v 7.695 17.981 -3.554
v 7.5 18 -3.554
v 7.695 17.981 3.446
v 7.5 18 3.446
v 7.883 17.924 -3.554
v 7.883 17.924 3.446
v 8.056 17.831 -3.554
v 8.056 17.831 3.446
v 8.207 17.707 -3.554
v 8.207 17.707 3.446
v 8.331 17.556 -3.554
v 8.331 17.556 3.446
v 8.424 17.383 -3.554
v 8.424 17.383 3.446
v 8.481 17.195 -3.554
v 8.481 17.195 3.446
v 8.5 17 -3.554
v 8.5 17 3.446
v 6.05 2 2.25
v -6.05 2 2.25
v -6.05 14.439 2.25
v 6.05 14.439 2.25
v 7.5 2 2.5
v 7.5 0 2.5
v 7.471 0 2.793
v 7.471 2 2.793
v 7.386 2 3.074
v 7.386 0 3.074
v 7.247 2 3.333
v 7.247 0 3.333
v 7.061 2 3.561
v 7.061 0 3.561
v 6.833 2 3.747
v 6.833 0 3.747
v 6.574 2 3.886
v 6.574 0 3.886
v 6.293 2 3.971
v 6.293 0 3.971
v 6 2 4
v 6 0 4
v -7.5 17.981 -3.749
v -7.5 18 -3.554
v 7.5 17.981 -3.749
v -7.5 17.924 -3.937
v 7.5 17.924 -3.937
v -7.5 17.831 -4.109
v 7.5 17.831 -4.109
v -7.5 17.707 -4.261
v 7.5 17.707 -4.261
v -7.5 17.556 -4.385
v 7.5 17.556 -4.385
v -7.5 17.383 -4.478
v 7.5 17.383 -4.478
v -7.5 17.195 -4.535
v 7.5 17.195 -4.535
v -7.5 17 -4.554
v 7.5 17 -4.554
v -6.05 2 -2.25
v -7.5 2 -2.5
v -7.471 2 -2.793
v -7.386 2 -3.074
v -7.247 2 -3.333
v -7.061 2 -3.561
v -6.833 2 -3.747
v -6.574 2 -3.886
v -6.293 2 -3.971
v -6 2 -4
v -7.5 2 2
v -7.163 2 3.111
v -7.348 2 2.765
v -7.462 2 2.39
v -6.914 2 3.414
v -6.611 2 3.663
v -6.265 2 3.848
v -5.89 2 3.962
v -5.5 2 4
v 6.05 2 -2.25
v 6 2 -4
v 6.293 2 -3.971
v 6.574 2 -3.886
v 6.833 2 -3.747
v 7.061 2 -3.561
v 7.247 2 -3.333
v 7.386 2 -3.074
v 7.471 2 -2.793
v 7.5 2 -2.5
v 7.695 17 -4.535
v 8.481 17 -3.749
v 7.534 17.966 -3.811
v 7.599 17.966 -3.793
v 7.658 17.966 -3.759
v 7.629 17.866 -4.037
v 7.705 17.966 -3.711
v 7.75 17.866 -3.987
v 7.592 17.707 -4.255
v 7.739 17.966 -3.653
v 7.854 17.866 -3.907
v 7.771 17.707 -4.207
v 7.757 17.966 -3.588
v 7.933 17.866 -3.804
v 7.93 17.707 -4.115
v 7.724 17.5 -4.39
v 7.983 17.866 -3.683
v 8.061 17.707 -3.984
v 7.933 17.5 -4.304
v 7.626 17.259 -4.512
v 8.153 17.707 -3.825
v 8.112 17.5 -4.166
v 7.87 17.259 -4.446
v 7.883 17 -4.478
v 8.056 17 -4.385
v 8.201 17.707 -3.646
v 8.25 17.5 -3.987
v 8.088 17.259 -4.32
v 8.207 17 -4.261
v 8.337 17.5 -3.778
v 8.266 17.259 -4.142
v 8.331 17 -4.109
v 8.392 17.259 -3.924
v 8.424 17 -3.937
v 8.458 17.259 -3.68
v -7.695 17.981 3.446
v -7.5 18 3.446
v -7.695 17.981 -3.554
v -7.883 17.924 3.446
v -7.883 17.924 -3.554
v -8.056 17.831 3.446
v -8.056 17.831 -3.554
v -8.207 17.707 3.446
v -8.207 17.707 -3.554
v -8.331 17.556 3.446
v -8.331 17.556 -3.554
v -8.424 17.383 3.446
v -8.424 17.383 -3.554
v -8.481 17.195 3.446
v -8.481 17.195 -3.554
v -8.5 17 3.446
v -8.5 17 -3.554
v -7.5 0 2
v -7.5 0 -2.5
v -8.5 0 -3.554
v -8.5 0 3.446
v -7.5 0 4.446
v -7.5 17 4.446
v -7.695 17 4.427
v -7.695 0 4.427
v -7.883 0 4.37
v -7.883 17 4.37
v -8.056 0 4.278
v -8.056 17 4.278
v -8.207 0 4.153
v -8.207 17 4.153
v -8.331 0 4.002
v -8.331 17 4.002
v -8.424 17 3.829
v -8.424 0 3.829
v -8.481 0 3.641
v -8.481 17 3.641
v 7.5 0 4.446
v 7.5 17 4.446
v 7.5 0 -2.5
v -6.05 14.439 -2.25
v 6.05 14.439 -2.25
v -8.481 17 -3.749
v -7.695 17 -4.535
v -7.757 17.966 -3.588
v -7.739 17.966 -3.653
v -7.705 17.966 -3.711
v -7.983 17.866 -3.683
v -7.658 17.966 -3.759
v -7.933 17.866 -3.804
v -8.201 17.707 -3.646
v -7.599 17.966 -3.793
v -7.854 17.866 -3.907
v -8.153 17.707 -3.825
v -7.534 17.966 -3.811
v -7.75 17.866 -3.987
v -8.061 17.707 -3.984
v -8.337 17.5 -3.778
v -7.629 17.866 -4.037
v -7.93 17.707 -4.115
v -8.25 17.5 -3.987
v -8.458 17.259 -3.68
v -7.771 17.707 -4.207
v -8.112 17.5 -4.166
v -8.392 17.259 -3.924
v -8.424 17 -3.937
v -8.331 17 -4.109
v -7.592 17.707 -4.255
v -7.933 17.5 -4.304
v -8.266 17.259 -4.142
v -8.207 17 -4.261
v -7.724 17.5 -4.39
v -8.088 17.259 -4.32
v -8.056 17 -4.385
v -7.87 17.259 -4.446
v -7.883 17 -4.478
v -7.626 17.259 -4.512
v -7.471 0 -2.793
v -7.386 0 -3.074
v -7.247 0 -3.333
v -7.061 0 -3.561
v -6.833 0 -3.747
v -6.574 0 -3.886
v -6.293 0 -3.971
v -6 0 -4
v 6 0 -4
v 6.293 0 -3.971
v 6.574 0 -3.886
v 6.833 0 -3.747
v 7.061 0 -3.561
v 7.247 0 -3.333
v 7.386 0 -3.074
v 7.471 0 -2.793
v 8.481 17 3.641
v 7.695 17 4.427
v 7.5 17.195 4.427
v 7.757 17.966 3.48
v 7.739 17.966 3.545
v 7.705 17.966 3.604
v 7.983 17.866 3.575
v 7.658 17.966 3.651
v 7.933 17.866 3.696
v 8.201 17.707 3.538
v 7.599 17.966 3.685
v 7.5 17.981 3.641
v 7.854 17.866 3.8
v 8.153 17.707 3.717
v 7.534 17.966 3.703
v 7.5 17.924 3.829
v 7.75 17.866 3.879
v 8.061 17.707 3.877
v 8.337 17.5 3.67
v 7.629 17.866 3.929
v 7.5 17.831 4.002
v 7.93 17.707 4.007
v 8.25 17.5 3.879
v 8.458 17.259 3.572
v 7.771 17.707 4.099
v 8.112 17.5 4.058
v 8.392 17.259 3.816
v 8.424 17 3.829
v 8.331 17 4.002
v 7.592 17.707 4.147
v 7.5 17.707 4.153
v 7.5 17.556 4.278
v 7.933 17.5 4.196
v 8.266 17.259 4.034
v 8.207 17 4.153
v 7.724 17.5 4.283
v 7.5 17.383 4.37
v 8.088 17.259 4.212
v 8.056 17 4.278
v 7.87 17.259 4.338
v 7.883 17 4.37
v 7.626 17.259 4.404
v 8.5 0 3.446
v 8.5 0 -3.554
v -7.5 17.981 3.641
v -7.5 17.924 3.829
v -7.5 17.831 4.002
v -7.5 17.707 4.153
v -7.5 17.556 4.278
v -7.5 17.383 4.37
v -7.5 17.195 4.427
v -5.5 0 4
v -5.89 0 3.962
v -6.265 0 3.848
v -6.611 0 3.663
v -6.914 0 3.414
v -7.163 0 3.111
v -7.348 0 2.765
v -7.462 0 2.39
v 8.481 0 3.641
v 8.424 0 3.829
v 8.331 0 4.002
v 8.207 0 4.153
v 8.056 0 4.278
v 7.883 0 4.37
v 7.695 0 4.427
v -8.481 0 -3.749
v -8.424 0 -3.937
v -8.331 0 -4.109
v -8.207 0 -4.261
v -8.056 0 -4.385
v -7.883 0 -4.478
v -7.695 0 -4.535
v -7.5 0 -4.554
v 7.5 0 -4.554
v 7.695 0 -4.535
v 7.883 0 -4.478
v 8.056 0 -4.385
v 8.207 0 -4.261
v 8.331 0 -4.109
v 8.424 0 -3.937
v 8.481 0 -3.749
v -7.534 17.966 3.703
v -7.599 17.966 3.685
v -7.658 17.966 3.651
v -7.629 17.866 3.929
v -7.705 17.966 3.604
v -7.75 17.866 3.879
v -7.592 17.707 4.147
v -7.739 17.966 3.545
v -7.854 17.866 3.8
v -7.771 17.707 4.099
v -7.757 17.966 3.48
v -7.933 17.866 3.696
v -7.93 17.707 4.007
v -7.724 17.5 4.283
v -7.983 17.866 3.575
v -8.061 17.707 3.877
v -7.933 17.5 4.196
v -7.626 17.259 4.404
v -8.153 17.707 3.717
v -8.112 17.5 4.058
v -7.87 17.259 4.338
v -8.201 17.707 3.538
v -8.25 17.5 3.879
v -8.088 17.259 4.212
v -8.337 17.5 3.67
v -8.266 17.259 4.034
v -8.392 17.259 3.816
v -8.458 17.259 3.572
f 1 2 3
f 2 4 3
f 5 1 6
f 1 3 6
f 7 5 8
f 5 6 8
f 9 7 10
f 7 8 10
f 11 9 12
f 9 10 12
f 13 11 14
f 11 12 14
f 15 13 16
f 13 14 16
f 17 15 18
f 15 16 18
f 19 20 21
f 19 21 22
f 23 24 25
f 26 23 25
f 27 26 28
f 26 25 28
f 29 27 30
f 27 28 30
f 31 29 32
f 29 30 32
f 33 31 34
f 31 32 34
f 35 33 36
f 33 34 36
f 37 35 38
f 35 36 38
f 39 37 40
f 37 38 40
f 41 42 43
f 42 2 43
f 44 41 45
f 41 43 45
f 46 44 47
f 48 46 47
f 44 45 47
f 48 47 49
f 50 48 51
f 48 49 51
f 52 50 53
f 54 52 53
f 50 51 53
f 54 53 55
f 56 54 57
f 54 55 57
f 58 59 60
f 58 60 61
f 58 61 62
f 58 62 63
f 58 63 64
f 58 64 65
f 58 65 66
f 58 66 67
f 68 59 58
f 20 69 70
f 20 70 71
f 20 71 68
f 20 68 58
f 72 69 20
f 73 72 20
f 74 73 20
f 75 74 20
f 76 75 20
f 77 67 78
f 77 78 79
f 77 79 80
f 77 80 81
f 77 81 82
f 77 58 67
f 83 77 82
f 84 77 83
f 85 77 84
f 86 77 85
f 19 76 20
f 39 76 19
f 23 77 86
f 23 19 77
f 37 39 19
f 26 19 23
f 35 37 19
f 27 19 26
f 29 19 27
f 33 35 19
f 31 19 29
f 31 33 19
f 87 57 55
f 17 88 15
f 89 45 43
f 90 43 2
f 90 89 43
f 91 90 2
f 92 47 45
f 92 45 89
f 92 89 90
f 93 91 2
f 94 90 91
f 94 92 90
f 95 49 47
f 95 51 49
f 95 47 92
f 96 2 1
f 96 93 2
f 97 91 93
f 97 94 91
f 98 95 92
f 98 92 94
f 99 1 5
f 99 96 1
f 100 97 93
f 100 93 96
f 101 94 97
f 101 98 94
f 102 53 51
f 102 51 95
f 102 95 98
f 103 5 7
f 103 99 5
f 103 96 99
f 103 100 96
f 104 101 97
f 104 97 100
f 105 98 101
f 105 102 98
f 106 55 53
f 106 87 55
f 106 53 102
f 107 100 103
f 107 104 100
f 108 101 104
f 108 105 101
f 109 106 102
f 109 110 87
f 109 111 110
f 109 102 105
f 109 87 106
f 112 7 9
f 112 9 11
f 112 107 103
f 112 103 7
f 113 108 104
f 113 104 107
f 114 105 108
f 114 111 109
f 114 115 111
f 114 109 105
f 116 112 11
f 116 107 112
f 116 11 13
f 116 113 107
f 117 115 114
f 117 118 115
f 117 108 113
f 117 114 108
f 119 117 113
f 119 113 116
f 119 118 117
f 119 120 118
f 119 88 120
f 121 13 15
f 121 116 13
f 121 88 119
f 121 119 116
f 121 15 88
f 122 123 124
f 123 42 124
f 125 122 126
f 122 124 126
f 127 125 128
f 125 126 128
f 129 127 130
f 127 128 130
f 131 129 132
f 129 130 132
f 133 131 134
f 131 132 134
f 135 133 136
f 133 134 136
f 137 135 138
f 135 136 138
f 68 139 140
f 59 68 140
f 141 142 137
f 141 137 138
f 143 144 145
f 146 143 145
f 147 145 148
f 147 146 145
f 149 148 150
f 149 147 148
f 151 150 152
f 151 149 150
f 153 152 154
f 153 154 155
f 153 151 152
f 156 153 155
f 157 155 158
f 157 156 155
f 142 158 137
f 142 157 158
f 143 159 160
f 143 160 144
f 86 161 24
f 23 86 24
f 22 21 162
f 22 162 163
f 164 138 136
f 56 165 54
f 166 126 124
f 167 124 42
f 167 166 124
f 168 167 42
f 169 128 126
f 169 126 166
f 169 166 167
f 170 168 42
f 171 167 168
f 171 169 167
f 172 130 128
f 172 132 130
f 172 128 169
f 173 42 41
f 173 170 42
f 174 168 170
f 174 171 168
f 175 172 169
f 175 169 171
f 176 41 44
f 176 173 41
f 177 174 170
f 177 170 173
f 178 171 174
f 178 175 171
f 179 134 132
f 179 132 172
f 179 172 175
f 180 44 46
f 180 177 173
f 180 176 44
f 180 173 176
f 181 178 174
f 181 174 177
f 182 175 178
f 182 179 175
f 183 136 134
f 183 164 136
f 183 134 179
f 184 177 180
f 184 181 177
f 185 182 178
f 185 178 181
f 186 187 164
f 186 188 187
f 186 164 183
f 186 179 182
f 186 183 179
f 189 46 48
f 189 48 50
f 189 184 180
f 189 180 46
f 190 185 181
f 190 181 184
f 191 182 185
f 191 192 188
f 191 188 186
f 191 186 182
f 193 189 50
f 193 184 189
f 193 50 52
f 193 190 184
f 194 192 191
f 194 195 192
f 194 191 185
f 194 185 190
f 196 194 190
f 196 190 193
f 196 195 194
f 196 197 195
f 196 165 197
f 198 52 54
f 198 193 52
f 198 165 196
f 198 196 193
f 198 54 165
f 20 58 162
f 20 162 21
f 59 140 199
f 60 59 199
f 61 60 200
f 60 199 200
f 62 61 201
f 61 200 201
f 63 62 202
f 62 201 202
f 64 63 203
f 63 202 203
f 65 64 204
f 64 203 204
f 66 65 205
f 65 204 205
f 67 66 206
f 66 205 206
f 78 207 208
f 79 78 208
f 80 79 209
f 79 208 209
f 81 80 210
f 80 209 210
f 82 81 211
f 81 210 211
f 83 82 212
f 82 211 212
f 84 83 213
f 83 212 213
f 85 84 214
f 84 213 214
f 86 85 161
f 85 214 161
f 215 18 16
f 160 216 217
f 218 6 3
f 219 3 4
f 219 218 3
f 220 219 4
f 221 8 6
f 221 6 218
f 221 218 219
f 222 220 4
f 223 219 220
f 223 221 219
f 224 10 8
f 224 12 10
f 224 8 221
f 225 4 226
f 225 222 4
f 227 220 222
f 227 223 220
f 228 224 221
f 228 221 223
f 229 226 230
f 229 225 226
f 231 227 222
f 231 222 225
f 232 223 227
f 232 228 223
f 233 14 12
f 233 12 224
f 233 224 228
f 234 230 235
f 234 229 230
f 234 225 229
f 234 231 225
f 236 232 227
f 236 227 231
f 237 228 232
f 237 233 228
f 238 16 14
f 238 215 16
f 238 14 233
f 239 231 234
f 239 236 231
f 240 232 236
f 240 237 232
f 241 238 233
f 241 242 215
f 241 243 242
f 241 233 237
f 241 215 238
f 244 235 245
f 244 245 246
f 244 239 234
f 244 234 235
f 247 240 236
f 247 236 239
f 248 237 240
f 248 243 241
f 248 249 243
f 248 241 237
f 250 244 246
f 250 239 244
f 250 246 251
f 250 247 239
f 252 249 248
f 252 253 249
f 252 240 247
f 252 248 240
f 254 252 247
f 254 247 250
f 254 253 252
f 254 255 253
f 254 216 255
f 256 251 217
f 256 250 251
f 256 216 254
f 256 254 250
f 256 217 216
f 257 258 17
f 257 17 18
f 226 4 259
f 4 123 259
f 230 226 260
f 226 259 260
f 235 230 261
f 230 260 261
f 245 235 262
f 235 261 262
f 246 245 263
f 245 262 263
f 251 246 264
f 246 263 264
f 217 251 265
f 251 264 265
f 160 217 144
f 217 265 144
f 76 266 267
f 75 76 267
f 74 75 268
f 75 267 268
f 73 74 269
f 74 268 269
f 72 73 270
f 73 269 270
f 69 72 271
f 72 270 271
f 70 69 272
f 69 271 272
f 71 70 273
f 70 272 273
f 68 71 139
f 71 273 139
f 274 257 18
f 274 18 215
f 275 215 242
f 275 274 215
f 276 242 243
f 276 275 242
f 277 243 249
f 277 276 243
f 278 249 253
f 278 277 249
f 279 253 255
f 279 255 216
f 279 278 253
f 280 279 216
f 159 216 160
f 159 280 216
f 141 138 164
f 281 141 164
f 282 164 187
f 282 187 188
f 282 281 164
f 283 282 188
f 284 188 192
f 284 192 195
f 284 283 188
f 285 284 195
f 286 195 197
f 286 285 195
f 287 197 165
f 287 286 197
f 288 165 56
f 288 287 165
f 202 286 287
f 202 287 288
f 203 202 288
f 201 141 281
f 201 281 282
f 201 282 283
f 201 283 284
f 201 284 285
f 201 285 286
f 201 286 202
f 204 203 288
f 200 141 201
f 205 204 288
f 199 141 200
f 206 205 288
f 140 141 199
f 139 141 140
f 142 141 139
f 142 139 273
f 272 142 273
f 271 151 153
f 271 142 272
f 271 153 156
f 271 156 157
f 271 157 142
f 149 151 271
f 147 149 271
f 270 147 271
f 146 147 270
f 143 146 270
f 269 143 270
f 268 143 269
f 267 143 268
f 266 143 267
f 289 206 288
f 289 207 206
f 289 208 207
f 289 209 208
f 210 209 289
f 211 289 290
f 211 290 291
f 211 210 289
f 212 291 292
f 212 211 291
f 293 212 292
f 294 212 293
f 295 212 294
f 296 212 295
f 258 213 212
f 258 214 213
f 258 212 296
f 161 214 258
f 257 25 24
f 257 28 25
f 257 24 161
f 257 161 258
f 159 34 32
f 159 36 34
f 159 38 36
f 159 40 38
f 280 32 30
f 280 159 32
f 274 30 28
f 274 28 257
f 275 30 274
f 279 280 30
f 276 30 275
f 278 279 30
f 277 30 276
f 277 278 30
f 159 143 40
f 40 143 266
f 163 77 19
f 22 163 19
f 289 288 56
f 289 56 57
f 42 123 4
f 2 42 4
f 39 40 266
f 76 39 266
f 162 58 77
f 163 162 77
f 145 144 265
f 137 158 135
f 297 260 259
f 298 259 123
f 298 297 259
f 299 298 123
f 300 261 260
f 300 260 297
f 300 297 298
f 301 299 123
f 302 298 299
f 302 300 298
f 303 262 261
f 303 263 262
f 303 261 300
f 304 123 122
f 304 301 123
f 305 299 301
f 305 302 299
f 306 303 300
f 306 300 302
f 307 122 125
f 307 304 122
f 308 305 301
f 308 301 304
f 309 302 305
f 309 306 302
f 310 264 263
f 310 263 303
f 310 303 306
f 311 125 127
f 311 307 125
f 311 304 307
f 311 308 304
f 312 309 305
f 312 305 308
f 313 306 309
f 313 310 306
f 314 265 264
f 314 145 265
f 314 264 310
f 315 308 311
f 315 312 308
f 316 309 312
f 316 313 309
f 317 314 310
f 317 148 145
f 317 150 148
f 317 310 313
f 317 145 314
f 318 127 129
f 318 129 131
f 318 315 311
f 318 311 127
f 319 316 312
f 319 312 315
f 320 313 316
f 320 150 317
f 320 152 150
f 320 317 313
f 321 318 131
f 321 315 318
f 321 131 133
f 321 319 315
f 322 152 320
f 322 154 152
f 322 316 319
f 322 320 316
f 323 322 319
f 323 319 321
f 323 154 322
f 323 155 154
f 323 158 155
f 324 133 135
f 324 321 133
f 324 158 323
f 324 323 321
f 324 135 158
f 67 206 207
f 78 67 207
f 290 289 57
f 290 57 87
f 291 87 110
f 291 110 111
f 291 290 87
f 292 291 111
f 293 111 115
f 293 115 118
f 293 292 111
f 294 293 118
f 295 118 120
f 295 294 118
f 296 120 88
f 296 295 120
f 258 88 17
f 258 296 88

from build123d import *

# Parameters (mm, degrees)
F1_DEPTH = 18
F2_W     = 12.1
F2_H     = 4.5
F3_DEPTH = 14.43852
F5_DEPTH = 2
F6_R     = 1


# Not quite as in the source:
# - a feature names something its author has since deleted; it is built from what else it names


with BuildPart() as f1:
    # F0 (on Front) → F1 (new body)
    with BuildSketch(Plane.XZ):
        with BuildLine():
            ThreePointArc((8.5, 3.4460804202), (8.2071067812, 4.1531872014), (7.5, 4.4460804202))
            Line((7.5, 4.4460804202), (-7.5, 4.4460804202))
            ThreePointArc((-7.5, 4.4460804202), (-8.2071067812, 4.1531872014), (-8.5, 3.4460804202))
            Line((-8.5, 3.4460804202), (-8.5, -3.5539195798))
            ThreePointArc((-8.5, -3.5539195798), (-8.2071067812, -4.261026361), (-7.5, -4.5539195798))
            Line((-7.5, -4.5539195798), (7.5, -4.5539195798))
            ThreePointArc((7.5, -4.5539195798), (8.2071067812, -4.261026361), (8.5, -3.5539195798))
            Line((8.5, -3.5539195798), (8.5, 3.4460804202))
        make_face()
    extrude(amount=-F1_DEPTH)

    # F2 (on face) → F3 (cut)
    with BuildSketch(Plane.XZ):
        Rectangle(F2_W, F2_H)
    extrude(amount=-F3_DEPTH, mode=Mode.SUBTRACT)

    # F4 (on face) → F5 (cut)
    with BuildSketch(Plane.XZ):
        with BuildLine():
            Line((-6, -4), (6, -4))
            ThreePointArc((6, -4), (7.0606601718, -3.5606601718), (7.5, -2.5))
            Line((7.5, -2.5), (7.5, 2.5))
            ThreePointArc((7.5, 2.5), (7.0606601718, 3.5606601718), (6, 4))
            Line((6, 4), (-5.5, 4))
            ThreePointArc((-5.5, 4), (-6.9142135624, 3.4142135624), (-7.5, 2))
            Line((-7.5, 2), (-7.5, -2.5))
            ThreePointArc((-7.5, -2.5), (-7.0606601718, -3.5606601718), (-6, -4))
        make_face()
    extrude(amount=-F5_DEPTH, mode=Mode.SUBTRACT)

    # F6
    f6_edges = [f1.edges().sort_by_distance(p)[0] for p in [
        (8.207107, 18, -4.261026),
        (8.5, 18, -0.05392),
        (8.207107, 18, 4.153187),
        (0, 18, 4.44608),
        (-8.207107, 18, 4.153187),
        (-8.5, 18, -0.05392),
        (-8.207107, 18, -4.261026),
        (0, 18, -4.55392),
    ]]
    fillet(f6_edges, radius=F6_R)


solid = f1.part
